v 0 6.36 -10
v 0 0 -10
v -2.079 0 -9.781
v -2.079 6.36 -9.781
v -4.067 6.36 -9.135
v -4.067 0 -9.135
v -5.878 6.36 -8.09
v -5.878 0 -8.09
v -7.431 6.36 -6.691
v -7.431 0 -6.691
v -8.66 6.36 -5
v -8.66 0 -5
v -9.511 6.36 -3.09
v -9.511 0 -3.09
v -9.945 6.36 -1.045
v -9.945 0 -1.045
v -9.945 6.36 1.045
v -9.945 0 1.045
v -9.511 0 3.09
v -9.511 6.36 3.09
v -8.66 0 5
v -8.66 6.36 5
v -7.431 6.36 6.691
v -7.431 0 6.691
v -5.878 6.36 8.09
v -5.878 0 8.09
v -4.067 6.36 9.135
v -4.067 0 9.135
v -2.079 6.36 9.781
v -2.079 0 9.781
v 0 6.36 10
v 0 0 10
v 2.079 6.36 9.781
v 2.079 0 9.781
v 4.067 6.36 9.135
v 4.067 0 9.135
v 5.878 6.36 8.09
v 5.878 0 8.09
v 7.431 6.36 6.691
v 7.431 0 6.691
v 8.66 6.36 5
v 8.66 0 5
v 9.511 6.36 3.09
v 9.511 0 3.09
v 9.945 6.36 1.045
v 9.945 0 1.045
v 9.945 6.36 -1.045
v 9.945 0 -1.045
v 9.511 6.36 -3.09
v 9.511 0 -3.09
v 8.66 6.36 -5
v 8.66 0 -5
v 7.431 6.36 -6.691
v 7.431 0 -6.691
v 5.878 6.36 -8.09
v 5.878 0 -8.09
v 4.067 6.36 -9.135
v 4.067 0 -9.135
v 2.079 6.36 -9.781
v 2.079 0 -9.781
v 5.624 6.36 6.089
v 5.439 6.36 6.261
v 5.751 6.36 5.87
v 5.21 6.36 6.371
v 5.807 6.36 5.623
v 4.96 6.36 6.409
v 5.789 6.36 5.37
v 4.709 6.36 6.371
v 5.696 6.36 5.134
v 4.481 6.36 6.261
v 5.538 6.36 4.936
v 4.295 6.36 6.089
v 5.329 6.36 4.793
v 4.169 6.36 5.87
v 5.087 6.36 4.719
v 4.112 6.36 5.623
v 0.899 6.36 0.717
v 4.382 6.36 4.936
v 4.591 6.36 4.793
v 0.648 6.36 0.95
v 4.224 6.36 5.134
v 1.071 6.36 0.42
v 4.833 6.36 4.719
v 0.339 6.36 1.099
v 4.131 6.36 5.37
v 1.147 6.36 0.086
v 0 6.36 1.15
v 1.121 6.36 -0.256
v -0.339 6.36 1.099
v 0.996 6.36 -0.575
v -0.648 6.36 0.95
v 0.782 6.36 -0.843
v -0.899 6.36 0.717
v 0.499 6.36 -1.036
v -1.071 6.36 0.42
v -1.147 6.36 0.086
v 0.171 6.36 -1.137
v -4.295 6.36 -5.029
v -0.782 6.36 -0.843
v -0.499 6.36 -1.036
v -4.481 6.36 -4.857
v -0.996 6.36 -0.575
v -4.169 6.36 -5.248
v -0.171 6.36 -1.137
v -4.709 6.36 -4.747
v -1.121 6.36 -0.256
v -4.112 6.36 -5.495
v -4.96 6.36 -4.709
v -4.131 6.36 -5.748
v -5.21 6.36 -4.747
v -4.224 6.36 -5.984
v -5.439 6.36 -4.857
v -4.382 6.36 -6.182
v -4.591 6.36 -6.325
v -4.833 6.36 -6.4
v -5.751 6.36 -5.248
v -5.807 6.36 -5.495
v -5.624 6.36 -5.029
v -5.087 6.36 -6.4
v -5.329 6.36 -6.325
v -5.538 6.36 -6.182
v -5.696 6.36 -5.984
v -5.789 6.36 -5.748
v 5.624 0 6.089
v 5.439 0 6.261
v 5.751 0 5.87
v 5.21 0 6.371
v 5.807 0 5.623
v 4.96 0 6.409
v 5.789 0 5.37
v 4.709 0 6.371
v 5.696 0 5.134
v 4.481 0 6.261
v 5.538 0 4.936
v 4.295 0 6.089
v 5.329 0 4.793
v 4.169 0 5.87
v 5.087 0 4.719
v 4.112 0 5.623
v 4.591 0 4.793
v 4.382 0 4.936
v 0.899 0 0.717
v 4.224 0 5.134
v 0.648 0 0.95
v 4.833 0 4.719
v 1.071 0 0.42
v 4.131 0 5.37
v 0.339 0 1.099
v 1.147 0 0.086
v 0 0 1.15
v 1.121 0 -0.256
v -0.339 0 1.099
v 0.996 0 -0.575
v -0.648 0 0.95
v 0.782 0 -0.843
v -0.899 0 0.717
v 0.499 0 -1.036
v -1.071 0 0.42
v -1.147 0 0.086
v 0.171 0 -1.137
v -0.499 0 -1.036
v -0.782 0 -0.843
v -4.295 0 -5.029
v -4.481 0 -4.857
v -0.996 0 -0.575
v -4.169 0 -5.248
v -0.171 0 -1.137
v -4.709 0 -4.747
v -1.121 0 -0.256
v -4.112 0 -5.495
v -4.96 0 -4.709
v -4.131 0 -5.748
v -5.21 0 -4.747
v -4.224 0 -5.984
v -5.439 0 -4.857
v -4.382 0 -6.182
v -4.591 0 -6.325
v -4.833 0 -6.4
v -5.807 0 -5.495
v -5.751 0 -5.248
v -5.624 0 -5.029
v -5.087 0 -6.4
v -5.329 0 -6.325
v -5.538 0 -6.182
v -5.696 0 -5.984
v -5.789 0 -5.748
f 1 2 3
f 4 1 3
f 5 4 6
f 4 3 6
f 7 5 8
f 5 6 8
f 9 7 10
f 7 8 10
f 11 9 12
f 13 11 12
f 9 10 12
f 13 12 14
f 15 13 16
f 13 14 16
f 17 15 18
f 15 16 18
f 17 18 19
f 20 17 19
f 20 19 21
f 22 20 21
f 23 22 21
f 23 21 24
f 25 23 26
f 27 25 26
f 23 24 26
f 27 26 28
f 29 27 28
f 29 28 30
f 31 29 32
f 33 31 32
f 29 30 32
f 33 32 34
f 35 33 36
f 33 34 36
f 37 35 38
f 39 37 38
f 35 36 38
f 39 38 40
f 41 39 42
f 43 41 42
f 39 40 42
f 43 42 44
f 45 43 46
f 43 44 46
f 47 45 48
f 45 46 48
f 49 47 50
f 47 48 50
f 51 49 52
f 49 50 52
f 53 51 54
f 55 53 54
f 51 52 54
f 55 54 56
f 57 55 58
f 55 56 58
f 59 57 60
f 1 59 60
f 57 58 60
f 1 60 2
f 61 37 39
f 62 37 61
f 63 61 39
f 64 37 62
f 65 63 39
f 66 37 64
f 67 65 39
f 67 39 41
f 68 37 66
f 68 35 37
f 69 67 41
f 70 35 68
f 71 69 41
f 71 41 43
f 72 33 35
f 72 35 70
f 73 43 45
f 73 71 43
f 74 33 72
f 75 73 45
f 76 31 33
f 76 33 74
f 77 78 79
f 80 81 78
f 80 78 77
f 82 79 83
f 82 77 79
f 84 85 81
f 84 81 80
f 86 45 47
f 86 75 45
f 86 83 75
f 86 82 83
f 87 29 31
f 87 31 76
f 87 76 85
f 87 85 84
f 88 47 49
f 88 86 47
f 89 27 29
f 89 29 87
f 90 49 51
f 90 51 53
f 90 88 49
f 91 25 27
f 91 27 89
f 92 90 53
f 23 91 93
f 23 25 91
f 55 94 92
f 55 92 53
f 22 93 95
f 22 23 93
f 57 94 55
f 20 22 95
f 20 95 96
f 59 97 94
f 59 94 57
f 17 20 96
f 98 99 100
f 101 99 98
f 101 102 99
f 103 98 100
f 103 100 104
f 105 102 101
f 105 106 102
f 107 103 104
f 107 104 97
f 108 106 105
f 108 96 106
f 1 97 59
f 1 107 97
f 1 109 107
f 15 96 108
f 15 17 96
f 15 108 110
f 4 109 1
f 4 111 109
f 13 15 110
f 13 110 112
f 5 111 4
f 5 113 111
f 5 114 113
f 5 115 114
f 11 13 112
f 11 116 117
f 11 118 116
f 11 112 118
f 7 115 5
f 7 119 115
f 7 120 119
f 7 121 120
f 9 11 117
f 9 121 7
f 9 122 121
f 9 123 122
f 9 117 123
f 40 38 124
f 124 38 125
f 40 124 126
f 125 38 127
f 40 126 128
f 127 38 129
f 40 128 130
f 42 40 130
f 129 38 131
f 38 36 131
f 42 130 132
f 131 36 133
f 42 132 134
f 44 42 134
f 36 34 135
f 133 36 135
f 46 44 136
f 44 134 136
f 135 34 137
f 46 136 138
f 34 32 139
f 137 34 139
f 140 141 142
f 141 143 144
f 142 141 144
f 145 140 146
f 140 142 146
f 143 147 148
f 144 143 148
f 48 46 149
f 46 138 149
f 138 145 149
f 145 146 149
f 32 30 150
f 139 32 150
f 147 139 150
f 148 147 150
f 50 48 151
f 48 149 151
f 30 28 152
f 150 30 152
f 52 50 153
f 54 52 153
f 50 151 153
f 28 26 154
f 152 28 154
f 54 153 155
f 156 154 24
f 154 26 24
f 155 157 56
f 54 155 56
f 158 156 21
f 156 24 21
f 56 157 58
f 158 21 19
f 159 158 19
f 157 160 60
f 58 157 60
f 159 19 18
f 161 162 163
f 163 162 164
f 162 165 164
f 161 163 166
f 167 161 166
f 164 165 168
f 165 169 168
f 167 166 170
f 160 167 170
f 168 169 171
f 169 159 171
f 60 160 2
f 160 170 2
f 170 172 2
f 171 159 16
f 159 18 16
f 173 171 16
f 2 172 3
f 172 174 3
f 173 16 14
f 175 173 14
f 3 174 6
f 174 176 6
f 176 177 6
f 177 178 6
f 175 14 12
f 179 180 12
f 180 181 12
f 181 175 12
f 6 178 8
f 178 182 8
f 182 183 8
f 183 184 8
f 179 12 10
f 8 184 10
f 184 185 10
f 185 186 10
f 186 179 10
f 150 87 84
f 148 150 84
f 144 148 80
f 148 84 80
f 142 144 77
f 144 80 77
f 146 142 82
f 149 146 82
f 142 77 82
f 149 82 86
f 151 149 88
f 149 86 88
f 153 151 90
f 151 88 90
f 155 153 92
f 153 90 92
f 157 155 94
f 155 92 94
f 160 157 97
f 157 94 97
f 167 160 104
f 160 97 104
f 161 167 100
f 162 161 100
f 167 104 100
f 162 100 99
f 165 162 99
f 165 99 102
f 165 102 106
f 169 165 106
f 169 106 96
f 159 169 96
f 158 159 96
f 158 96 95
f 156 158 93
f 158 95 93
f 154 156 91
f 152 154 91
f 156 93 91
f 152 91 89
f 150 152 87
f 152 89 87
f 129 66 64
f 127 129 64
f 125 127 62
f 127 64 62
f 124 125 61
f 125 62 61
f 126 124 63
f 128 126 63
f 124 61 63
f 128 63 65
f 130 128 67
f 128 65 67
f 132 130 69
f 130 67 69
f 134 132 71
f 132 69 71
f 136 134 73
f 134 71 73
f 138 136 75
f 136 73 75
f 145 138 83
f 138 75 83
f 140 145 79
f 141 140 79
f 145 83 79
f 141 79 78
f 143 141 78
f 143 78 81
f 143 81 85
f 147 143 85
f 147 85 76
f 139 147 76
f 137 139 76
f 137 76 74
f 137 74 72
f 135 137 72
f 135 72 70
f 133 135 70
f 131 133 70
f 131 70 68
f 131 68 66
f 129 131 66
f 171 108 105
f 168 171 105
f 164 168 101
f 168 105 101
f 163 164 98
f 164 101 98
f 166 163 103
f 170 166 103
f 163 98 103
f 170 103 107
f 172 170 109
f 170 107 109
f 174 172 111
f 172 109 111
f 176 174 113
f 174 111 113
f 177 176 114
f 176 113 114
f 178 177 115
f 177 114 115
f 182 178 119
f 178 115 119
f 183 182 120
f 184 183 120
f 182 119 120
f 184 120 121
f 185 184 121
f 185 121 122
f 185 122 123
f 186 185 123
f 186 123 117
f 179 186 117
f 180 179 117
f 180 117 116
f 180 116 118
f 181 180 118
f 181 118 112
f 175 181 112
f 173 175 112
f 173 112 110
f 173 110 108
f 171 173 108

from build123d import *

# Parameters (mm, degrees)
SKETCH1_R           = 10
BOSS_EXTRUDE1_DEPTH = 6.36
SKETCH2_R           = 1.15
CUT_EXTRUDE1_DEPTH  = 6.36
CUT_EXTRUDE2_REACH  = 17.506
SKETCH3_R           = 0.85
CUT_EXTRUDE3_REACH  = 17.506
SKETCH4_R           = 0.85


with BuildPart() as part:
    # Sketch1 → Boss-Extrude1 (new body)
    with BuildSketch(Plane(origin=(0, 0, 0), x_dir=(1, 0, 0), z_dir=(0, 1, 0))):
        with Locations(Location((0, 0, 0), (0, 0, 90))):
            Circle(SKETCH1_R)
    extrude(amount=BOSS_EXTRUDE1_DEPTH)

    # Sketch2 → Cut-Extrude1 (cut)
    with BuildSketch(Plane(origin=(0, 6.36, 0), x_dir=(1, 0, 0), z_dir=(0, 1, 0))):
        with Locations(Location((0, 0, 0), (0, 0, 270))):
            Circle(SKETCH2_R)
    extrude(amount=-CUT_EXTRUDE1_DEPTH, mode=Mode.SUBTRACT)

    # Sketch3 → Cut-Extrude2 (cut, up to next)
    with BuildSketch(Plane(origin=(0, 6.36, 0), x_dir=(1, 0, 0), z_dir=(0, 1, 0)), mode=Mode.PRIVATE) as cut_extrude2_sk1:
        with Locations(Location((4.959818651, -5.559019603, 0), (0, 0, 270))):
            Circle(SKETCH3_R)
    cut_extrude2_tool1 = extrude(cut_extrude2_sk1.sketch, amount=-CUT_EXTRUDE2_REACH, mode=Mode.PRIVATE) & part.part
    add(cut_extrude2_tool1.solids().sort_by_distance((4.959819, 6.36, 5.55902))[0], mode=Mode.SUBTRACT)

    # Sketch4 → Cut-Extrude3 (cut, up to next)
    with BuildSketch(Plane(origin=(0, 6.36, 0), x_dir=(1, 0, 0), z_dir=(0, 1, 0)), mode=Mode.PRIVATE) as cut_extrude3_sk1:
        with Locations(Location((-4.959818651, 5.559019603, 0), (0, 0, 270))):
            Circle(SKETCH4_R)
    cut_extrude3_tool1 = extrude(cut_extrude3_sk1.sketch, amount=-CUT_EXTRUDE3_REACH, mode=Mode.PRIVATE) & part.part
    add(cut_extrude3_tool1.solids().sort_by_distance((-4.959819, 6.36, -5.55902))[0], mode=Mode.SUBTRACT)


solid = part.part
